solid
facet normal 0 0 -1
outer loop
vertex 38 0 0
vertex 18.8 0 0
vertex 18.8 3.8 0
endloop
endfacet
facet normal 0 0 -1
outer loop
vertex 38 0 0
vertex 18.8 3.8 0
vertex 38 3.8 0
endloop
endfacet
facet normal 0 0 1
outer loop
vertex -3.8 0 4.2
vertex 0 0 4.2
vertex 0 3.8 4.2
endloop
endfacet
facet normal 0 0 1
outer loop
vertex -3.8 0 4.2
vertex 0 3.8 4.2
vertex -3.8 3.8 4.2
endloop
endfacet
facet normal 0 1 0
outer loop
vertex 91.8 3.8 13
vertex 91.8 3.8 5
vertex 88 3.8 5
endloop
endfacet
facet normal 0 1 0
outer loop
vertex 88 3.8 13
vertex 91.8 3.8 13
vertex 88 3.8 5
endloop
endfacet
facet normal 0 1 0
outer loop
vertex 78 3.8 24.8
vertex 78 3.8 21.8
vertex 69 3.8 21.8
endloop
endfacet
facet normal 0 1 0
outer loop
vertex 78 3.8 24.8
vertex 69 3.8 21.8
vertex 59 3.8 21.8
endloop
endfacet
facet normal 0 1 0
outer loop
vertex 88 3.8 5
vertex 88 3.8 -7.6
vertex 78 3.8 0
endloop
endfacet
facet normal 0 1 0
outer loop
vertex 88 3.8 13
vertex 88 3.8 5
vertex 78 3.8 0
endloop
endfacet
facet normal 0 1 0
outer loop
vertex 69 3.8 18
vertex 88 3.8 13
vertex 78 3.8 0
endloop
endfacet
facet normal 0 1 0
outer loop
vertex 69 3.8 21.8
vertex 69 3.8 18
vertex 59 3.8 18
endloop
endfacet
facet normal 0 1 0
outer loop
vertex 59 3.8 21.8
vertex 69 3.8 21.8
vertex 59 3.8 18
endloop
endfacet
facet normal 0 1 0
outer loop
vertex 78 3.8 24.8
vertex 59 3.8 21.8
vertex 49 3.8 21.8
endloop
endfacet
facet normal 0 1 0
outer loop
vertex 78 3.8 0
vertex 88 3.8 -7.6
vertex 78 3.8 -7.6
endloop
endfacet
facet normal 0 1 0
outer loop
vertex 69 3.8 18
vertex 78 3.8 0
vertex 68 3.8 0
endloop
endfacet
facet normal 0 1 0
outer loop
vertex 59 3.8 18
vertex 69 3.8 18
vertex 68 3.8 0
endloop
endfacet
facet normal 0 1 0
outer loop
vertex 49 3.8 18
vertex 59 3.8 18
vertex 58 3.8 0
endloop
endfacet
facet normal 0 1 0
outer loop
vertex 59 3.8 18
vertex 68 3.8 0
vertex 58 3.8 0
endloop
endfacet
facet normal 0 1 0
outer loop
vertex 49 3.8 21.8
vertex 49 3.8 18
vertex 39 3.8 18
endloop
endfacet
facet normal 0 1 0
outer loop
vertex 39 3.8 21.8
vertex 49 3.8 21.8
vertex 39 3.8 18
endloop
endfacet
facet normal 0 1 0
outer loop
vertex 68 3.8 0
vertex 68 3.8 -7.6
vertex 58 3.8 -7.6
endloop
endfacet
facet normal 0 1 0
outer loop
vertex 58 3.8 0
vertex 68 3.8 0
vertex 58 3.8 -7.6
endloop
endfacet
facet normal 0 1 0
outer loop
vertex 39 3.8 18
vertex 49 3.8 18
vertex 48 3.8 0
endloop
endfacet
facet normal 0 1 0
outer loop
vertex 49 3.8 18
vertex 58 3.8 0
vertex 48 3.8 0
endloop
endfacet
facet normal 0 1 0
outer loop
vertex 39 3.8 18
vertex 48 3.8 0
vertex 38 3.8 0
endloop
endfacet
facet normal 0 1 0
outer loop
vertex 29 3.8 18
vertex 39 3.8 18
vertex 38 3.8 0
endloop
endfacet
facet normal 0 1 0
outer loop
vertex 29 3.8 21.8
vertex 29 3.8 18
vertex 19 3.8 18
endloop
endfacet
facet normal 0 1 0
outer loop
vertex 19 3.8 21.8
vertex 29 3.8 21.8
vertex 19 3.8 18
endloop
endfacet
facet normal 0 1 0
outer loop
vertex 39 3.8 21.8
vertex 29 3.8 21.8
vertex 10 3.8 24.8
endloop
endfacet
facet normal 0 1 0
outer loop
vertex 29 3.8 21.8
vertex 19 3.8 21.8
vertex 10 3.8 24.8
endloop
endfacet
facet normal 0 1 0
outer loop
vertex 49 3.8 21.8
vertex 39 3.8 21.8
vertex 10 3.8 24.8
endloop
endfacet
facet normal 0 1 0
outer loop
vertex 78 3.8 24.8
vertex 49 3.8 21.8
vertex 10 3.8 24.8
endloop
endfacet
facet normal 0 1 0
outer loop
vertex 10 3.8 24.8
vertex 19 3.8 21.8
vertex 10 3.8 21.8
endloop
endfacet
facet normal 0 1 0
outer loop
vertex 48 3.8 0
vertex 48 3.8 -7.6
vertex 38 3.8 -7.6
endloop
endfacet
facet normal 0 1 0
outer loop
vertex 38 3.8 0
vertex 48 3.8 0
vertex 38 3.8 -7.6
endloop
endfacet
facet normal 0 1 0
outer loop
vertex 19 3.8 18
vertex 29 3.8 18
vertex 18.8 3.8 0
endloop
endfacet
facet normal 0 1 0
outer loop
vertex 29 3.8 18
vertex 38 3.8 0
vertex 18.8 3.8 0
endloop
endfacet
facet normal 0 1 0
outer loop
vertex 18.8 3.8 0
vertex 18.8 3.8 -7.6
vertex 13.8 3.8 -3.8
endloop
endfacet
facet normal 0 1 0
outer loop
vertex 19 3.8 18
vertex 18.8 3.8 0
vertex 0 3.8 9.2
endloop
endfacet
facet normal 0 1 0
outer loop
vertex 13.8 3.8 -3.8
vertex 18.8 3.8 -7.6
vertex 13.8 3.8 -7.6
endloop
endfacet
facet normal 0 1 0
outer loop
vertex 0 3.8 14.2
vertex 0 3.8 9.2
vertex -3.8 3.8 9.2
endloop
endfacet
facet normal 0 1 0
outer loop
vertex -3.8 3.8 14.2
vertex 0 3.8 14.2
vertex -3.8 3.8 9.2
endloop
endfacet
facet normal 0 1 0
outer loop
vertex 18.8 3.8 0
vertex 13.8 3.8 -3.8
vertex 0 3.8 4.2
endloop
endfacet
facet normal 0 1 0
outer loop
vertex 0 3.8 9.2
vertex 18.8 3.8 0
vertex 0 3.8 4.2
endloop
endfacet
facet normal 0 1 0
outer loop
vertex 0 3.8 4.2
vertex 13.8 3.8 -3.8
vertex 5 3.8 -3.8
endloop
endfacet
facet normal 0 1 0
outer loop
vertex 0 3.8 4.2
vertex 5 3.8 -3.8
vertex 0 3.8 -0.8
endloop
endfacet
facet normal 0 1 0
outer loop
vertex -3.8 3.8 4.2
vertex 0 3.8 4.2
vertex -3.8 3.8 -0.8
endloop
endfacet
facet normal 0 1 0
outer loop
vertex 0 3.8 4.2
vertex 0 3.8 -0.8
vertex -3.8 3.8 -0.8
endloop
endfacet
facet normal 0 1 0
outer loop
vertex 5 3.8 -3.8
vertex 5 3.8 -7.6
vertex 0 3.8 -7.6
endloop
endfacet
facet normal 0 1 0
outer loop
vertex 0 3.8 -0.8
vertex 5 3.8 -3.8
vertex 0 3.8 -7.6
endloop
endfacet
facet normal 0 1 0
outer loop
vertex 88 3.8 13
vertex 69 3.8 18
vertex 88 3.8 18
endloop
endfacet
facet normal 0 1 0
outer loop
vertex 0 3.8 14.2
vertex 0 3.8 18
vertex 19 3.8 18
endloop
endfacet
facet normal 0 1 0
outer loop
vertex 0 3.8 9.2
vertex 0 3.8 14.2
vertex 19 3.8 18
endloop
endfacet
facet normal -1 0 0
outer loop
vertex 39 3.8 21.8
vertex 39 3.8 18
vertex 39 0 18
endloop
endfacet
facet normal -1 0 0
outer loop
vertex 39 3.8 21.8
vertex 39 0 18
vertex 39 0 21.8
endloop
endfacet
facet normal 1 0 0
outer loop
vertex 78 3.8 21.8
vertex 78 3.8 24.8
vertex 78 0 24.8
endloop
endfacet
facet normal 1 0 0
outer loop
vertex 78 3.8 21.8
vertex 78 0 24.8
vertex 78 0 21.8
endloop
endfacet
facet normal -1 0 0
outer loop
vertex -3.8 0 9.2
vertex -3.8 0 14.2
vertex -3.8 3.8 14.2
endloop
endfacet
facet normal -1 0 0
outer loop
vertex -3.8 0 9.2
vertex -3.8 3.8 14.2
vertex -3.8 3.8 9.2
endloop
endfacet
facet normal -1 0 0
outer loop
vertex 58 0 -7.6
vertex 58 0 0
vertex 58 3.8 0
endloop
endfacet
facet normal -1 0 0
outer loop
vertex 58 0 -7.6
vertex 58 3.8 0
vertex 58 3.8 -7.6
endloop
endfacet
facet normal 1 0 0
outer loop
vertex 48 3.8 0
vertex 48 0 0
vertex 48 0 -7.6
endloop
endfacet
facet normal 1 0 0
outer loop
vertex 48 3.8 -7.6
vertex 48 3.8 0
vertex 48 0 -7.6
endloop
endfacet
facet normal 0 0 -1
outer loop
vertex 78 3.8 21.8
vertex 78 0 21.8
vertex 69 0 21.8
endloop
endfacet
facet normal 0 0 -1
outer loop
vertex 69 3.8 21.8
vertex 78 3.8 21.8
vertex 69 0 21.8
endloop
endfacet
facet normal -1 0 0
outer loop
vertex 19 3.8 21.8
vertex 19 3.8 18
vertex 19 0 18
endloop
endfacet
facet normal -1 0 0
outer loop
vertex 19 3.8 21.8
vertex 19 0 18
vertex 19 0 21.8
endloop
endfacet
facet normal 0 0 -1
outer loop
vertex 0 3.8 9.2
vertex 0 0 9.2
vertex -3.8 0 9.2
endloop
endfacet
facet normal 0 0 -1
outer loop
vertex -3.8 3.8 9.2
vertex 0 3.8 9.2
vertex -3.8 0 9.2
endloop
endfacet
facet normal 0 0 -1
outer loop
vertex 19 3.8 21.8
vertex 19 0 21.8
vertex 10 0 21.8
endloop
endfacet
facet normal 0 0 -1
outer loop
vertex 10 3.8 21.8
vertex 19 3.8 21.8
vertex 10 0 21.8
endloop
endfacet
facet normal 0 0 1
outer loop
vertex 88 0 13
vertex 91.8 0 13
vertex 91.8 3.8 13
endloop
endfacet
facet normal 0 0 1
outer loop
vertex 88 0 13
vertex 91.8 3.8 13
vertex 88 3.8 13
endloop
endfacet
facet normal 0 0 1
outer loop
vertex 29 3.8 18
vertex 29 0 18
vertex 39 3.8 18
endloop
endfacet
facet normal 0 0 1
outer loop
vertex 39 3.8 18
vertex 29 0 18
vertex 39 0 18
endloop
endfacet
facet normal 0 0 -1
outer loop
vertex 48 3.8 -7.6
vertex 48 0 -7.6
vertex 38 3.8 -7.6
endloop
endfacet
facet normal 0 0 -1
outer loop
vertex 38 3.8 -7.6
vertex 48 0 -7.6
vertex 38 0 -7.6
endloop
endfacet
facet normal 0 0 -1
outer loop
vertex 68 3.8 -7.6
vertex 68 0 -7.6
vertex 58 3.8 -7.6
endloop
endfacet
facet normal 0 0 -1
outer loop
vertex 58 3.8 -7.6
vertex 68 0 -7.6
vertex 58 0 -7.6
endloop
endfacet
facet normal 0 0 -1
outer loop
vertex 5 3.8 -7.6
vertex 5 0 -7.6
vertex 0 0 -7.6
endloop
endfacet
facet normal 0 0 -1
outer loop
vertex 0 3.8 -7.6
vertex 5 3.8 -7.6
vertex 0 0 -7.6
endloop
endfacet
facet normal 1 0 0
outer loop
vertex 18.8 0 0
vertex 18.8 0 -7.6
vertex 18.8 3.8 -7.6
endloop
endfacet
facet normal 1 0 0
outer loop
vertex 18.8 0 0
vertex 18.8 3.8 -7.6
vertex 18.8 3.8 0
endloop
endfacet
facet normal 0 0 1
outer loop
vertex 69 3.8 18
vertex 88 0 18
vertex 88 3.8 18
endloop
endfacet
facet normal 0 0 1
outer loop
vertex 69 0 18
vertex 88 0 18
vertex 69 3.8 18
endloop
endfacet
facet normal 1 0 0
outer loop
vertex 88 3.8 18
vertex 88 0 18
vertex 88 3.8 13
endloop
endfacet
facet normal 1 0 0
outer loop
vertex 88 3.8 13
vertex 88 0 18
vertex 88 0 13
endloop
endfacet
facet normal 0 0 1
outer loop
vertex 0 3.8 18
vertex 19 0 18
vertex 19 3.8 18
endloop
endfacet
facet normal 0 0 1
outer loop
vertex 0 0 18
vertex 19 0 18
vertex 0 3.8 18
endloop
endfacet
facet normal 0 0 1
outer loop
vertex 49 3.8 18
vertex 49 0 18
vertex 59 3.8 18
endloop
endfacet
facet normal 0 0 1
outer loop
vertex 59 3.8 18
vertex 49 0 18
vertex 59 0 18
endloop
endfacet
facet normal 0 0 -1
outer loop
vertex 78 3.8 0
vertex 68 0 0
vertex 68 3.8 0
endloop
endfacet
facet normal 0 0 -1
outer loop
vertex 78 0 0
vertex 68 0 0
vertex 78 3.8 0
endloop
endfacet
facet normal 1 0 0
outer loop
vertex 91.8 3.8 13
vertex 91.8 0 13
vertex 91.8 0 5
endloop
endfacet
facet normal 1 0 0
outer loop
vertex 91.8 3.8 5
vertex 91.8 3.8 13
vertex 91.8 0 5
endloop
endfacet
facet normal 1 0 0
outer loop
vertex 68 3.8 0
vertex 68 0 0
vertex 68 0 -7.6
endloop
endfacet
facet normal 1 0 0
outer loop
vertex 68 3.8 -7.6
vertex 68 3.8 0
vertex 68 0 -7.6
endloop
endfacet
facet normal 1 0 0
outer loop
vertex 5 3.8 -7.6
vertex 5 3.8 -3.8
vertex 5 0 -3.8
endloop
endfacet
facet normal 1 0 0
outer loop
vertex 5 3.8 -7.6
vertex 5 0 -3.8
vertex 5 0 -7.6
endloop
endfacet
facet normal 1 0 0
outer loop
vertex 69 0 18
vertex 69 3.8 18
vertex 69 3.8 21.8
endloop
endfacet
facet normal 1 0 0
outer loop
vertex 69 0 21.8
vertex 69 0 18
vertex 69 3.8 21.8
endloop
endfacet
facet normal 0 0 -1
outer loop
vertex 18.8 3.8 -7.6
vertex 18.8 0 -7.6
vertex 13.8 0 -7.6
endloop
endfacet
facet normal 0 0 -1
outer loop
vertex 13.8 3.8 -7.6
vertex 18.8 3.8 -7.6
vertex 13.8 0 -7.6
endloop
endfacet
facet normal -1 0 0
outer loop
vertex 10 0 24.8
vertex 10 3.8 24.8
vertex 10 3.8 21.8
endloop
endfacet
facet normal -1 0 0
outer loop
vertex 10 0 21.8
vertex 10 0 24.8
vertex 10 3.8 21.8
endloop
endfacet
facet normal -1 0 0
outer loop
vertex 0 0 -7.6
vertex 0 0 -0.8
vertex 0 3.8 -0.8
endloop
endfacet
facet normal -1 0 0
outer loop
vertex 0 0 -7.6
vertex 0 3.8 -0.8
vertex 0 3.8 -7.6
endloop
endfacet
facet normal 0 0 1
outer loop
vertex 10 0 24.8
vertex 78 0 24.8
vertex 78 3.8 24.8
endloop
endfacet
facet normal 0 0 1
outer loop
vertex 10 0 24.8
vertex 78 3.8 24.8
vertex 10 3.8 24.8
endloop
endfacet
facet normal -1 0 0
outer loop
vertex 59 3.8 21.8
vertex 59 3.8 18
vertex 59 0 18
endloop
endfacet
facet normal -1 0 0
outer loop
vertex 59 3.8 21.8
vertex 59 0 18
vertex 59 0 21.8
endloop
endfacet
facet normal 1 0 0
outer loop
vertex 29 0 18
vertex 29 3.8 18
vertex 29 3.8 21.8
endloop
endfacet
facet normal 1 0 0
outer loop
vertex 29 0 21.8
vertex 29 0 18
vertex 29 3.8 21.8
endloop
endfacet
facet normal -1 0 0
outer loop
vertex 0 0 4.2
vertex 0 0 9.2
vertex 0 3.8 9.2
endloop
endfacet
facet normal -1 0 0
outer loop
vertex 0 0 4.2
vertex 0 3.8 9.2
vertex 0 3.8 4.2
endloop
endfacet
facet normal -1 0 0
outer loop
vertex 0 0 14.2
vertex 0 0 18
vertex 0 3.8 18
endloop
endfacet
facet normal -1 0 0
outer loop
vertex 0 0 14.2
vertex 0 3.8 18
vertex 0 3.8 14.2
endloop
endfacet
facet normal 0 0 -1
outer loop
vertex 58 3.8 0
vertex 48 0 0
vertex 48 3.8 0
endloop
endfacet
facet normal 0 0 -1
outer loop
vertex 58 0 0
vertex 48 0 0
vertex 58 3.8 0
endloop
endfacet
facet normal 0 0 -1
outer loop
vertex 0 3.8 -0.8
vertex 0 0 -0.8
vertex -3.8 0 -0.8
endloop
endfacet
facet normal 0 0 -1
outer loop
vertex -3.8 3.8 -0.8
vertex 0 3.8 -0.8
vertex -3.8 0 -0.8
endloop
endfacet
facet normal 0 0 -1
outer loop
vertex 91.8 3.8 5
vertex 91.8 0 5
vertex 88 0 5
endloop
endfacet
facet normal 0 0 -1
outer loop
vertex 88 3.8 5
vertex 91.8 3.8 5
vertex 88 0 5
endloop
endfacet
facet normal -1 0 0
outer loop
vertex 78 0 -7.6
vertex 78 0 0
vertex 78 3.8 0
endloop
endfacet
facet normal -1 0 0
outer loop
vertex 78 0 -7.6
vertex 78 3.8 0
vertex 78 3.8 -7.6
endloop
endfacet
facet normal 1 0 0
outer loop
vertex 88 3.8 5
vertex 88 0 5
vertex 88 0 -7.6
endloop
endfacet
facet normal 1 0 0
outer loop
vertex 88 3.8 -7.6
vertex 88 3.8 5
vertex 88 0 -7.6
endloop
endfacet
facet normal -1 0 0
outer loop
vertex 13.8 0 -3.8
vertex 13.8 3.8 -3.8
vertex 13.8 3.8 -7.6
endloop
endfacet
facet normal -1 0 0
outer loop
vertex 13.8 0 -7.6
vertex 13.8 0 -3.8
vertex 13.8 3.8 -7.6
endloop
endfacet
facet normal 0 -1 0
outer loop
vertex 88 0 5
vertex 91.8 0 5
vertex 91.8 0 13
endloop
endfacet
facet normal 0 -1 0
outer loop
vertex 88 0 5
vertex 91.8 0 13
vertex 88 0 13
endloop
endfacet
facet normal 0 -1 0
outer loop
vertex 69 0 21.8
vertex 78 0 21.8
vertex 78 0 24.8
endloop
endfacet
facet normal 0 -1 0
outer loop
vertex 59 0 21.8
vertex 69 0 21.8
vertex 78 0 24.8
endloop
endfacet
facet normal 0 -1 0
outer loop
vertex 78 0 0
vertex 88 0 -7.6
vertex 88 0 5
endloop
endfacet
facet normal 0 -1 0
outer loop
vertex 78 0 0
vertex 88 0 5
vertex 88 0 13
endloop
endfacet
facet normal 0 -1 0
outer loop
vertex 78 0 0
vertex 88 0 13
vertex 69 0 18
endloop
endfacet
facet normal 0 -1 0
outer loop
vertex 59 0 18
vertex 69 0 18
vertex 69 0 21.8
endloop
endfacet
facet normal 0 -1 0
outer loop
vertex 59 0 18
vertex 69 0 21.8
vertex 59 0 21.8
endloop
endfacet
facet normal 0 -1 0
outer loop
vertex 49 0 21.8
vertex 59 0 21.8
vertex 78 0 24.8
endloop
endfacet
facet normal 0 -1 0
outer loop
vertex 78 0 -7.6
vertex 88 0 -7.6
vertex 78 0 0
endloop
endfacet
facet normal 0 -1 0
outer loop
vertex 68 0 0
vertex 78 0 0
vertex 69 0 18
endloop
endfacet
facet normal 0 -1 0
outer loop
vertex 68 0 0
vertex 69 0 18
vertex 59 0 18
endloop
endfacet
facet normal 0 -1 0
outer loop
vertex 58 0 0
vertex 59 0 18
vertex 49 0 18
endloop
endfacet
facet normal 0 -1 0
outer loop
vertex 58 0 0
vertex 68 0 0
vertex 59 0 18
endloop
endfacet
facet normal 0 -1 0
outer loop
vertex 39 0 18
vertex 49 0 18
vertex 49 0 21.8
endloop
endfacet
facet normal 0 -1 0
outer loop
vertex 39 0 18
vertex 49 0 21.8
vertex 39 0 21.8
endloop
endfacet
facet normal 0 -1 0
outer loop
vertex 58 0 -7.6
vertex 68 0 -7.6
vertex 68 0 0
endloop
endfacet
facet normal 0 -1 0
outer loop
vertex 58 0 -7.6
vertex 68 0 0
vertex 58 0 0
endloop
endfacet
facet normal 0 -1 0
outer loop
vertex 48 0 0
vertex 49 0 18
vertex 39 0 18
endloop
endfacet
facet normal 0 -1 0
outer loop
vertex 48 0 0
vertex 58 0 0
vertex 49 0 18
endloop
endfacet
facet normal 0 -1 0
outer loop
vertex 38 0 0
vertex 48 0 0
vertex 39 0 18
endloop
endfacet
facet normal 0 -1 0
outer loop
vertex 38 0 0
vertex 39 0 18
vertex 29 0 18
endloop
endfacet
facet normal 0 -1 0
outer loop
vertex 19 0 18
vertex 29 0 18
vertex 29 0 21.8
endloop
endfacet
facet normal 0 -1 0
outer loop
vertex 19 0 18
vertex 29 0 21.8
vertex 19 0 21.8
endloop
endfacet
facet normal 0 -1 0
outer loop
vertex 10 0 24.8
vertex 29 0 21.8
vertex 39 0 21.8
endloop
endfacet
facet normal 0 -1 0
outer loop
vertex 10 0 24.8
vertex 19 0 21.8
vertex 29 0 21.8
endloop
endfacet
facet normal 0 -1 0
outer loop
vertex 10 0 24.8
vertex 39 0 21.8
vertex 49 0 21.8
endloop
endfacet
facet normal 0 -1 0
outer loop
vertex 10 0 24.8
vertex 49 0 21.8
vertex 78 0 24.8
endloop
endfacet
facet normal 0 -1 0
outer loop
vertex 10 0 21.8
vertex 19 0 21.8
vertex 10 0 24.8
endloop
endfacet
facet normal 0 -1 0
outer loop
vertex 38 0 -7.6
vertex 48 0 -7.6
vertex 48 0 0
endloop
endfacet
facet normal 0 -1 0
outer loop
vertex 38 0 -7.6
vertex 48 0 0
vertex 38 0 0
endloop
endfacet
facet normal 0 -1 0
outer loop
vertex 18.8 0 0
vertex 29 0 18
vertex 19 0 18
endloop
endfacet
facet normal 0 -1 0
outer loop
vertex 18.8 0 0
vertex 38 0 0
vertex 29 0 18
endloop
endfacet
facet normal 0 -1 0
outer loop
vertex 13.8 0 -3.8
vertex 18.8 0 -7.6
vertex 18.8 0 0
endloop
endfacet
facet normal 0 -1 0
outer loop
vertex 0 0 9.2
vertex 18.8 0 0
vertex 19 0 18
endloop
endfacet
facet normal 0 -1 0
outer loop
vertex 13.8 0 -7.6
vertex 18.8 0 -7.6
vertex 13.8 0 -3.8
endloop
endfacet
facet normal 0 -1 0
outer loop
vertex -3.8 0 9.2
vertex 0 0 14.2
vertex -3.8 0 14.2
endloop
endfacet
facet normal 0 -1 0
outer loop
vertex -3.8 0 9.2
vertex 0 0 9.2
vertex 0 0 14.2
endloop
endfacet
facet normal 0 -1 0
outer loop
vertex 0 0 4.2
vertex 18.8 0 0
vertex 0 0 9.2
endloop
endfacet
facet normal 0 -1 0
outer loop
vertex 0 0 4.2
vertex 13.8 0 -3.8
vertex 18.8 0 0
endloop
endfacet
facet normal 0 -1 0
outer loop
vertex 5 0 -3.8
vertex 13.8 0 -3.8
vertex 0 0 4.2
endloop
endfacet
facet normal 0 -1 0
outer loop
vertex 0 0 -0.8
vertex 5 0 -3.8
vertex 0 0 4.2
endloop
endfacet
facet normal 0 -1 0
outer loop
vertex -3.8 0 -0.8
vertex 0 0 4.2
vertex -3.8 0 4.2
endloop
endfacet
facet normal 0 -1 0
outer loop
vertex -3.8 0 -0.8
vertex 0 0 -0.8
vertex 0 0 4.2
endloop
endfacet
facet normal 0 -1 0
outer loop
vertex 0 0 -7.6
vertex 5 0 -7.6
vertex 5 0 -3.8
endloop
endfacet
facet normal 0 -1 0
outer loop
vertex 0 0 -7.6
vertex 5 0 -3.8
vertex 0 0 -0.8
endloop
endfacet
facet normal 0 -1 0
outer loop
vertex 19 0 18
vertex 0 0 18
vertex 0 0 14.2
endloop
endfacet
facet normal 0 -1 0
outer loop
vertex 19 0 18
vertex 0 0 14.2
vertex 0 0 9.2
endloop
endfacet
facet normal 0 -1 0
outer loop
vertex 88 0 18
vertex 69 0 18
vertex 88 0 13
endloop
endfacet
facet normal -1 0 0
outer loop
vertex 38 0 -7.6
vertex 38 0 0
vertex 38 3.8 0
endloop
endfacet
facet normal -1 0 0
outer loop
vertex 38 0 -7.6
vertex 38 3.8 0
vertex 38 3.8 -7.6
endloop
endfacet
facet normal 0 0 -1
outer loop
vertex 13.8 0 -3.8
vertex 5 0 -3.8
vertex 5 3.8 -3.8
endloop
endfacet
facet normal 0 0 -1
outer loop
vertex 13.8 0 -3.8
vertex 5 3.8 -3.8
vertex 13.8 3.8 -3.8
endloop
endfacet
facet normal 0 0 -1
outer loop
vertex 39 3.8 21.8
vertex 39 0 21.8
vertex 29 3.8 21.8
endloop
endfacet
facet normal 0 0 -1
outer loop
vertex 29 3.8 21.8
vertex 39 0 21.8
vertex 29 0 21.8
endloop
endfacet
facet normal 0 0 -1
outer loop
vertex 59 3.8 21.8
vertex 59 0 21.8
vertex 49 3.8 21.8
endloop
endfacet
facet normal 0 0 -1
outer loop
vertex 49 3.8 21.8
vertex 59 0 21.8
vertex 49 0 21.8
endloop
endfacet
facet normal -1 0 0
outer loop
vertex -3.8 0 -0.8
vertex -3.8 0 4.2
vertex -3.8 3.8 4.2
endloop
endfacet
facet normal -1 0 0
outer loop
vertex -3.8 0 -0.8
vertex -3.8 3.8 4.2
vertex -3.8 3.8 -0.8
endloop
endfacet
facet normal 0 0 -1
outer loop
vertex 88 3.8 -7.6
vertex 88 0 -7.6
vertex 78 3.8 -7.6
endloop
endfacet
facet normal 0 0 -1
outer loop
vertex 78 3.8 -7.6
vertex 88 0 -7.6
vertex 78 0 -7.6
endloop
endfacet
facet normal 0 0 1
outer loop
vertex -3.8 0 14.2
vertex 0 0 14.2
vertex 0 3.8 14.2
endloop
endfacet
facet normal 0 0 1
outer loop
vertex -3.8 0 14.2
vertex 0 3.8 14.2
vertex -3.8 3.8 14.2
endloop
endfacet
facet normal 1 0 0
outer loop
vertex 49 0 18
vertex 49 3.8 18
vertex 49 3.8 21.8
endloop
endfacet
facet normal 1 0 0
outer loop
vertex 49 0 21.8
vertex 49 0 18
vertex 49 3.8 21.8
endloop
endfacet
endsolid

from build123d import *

# Parameters (mm, degrees)
SKETCH1_W           = 88
SKETCH1_H           = 18
BOSS_EXTRUDE1_DEPTH = 3.8
SKETCH2_W           = 18.8
SKETCH2_H           = 3.8
BOSS_EXTRUDE2_DEPTH = 3.8
SKETCH3_W           = 10
SKETCH3_H           = 3.8
BOSS_EXTRUDE3_DEPTH = 3.8
LPATTERN1_COUNT     = 3
LPATTERN1_PITCH     = 20
LPATTERN1_COL_COUNT = 3
LPATTERN1_COL_PITCH = 20
SKETCH4_W           = 1
SKETCH4_H           = 3.8
CUT_EXTRUDE1_DEPTH  = 92.709759568
SKETCH5_W           = 88
SKETCH5_H           = 3
BOSS_EXTRUDE4_DEPTH = 3.8
SKETCH6_W           = 5
SKETCH6_H           = 3.8
BOSS_EXTRUDE5_DEPTH = 3.8
SKETCH7_W           = 10
SKETCH7_H           = 7.6
BOSS_EXTRUDE6_DEPTH = 3.8
LPATTERN2_COUNT     = 3
LPATTERN2_PITCH     = 20
SKETCH9_W           = 9
SKETCH9_H           = 3.8
CUT_EXTRUDE2_DEPTH  = 92.506721065
SKETCH10_W          = 3.8
SKETCH10_H          = 5
SKETCH10_H_2        = 8
BOSS_EXTRUDE8_DEPTH = 3.8
SKETCH11_W          = 10
SKETCH11_H          = 3
CUT_EXTRUDE3_DEPTH  = 96.166800934


with BuildPart() as part:
    # Sketch1 → Boss-Extrude1 (new body)
    with BuildSketch(Plane(origin=(0, 0, 0), x_dir=(1, 0, 0), z_dir=(0, 1, 0))):
        with Locations((44, -9)):
            Rectangle(SKETCH1_W, SKETCH1_H)
    extrude(amount=BOSS_EXTRUDE1_DEPTH)

    # Sketch2 → Boss-Extrude2 (add, through all)
    with BuildSketch(Plane.XZ):
        with Locations((9.4, -1.9)):
            Rectangle(SKETCH2_W, SKETCH2_H)
    extrude(amount=-BOSS_EXTRUDE2_DEPTH)

    # Sketch3 → Boss-Extrude3 (add, through all)
    with BuildSketch(Plane.XZ):
        with Locations((44, 19.9)):
            Rectangle(SKETCH3_W, SKETCH3_H)
    boss_extrude3 = extrude(amount=-BOSS_EXTRUDE3_DEPTH)

    # LPattern1: Boss-Extrude3 ×3
    with Locations(*[(i * LPATTERN1_PITCH, 0, 0) for i in range(1, LPATTERN1_COUNT)]):
        add(boss_extrude3)

    # LPattern1 col: Boss-Extrude3 ×3
    with Locations(*[(-i * LPATTERN1_COL_PITCH, 0, 0) for i in range(1, LPATTERN1_COL_COUNT)]):
        add(boss_extrude3)

    # Sketch4 → Cut-Extrude1 (cut, through all)
    with BuildSketch(Plane(origin=(0, 0, 0), x_dir=(-1, 0, 0), z_dir=(0, -1, 0))):
        with Locations((0.5, -19.9)):
            Rectangle(SKETCH4_W, SKETCH4_H)
        with Locations((-88.5, -19.9)):
            Rectangle(SKETCH4_W, SKETCH4_H)
    extrude(amount=-CUT_EXTRUDE1_DEPTH, mode=Mode.SUBTRACT)

    # Sketch5 → Boss-Extrude4 (add, through all)
    with BuildSketch(Plane(origin=(0, 0, 0), x_dir=(-1, 0, 0), z_dir=(0, -1, 0))):
        with Locations((-44, -23.3)):
            Rectangle(SKETCH5_W, SKETCH5_H)
    extrude(amount=-BOSS_EXTRUDE4_DEPTH)

    # Sketch6 → Boss-Extrude5 (add, through all)
    with BuildSketch(Plane(origin=(0, 0, 0), x_dir=(-1, 0, 0), z_dir=(0, -1, 0))):
        with Locations((-2.5, 5.7)):
            Rectangle(SKETCH6_W, SKETCH6_H)
        with Locations((-16.3, 5.7)):
            Rectangle(SKETCH6_W, SKETCH6_H)
    extrude(amount=-BOSS_EXTRUDE5_DEPTH)

    # Sketch7 → Boss-Extrude6 (add, through all)
    with BuildSketch(Plane(origin=(0, 0, 0), x_dir=(-1, 0, 0), z_dir=(0, -1, 0))):
        with Locations((-83, 3.8)):
            Rectangle(SKETCH7_W, SKETCH7_H)
    boss_extrude6 = extrude(amount=-BOSS_EXTRUDE6_DEPTH)

    # LPattern2: Boss-Extrude6 ×3
    with Locations(*[(-i * LPATTERN2_PITCH, 0, 0) for i in range(1, LPATTERN2_COUNT)]):
        add(boss_extrude6)

    # Sketch9 → Cut-Extrude2 (cut, through all)
    with BuildSketch(Plane(origin=(0, 0, 0), x_dir=(-1, 0, 0), z_dir=(0, -1, 0))):
        with Locations((-4.5, -19.9)):
            Rectangle(SKETCH9_W, SKETCH9_H)
        with Locations((-83.5, -19.9)):
            Rectangle(SKETCH9_W, SKETCH9_H)
    extrude(amount=-CUT_EXTRUDE2_DEPTH, mode=Mode.SUBTRACT)

    # Sketch10 → Boss-Extrude8 (add, through all)
    with BuildSketch(Plane(origin=(0, 0, 0), x_dir=(-1, 0, 0), z_dir=(0, -1, 0))):
        with Locations((1.9, -11.7)):
            Rectangle(SKETCH10_W, SKETCH10_H)
        with Locations((-89.9, -9)):
            Rectangle(SKETCH10_W, SKETCH10_H_2)
        with Locations((1.9, -1.7)):
            Rectangle(SKETCH10_W, SKETCH10_H)
    extrude(amount=-BOSS_EXTRUDE8_DEPTH)

    # Sketch11 → Cut-Extrude3 (cut, through all)
    with BuildSketch(Plane(origin=(0, 0, 0), x_dir=(-1, 0, 0), z_dir=(0, -1, 0))):
        with Locations((-5, -23.3)):
            Rectangle(SKETCH11_W, SKETCH11_H)
        with Locations((-83, -23.3)):
            Rectangle(SKETCH11_W, SKETCH11_H)
    extrude(amount=-CUT_EXTRUDE3_DEPTH, mode=Mode.SUBTRACT)


solid = part.part
